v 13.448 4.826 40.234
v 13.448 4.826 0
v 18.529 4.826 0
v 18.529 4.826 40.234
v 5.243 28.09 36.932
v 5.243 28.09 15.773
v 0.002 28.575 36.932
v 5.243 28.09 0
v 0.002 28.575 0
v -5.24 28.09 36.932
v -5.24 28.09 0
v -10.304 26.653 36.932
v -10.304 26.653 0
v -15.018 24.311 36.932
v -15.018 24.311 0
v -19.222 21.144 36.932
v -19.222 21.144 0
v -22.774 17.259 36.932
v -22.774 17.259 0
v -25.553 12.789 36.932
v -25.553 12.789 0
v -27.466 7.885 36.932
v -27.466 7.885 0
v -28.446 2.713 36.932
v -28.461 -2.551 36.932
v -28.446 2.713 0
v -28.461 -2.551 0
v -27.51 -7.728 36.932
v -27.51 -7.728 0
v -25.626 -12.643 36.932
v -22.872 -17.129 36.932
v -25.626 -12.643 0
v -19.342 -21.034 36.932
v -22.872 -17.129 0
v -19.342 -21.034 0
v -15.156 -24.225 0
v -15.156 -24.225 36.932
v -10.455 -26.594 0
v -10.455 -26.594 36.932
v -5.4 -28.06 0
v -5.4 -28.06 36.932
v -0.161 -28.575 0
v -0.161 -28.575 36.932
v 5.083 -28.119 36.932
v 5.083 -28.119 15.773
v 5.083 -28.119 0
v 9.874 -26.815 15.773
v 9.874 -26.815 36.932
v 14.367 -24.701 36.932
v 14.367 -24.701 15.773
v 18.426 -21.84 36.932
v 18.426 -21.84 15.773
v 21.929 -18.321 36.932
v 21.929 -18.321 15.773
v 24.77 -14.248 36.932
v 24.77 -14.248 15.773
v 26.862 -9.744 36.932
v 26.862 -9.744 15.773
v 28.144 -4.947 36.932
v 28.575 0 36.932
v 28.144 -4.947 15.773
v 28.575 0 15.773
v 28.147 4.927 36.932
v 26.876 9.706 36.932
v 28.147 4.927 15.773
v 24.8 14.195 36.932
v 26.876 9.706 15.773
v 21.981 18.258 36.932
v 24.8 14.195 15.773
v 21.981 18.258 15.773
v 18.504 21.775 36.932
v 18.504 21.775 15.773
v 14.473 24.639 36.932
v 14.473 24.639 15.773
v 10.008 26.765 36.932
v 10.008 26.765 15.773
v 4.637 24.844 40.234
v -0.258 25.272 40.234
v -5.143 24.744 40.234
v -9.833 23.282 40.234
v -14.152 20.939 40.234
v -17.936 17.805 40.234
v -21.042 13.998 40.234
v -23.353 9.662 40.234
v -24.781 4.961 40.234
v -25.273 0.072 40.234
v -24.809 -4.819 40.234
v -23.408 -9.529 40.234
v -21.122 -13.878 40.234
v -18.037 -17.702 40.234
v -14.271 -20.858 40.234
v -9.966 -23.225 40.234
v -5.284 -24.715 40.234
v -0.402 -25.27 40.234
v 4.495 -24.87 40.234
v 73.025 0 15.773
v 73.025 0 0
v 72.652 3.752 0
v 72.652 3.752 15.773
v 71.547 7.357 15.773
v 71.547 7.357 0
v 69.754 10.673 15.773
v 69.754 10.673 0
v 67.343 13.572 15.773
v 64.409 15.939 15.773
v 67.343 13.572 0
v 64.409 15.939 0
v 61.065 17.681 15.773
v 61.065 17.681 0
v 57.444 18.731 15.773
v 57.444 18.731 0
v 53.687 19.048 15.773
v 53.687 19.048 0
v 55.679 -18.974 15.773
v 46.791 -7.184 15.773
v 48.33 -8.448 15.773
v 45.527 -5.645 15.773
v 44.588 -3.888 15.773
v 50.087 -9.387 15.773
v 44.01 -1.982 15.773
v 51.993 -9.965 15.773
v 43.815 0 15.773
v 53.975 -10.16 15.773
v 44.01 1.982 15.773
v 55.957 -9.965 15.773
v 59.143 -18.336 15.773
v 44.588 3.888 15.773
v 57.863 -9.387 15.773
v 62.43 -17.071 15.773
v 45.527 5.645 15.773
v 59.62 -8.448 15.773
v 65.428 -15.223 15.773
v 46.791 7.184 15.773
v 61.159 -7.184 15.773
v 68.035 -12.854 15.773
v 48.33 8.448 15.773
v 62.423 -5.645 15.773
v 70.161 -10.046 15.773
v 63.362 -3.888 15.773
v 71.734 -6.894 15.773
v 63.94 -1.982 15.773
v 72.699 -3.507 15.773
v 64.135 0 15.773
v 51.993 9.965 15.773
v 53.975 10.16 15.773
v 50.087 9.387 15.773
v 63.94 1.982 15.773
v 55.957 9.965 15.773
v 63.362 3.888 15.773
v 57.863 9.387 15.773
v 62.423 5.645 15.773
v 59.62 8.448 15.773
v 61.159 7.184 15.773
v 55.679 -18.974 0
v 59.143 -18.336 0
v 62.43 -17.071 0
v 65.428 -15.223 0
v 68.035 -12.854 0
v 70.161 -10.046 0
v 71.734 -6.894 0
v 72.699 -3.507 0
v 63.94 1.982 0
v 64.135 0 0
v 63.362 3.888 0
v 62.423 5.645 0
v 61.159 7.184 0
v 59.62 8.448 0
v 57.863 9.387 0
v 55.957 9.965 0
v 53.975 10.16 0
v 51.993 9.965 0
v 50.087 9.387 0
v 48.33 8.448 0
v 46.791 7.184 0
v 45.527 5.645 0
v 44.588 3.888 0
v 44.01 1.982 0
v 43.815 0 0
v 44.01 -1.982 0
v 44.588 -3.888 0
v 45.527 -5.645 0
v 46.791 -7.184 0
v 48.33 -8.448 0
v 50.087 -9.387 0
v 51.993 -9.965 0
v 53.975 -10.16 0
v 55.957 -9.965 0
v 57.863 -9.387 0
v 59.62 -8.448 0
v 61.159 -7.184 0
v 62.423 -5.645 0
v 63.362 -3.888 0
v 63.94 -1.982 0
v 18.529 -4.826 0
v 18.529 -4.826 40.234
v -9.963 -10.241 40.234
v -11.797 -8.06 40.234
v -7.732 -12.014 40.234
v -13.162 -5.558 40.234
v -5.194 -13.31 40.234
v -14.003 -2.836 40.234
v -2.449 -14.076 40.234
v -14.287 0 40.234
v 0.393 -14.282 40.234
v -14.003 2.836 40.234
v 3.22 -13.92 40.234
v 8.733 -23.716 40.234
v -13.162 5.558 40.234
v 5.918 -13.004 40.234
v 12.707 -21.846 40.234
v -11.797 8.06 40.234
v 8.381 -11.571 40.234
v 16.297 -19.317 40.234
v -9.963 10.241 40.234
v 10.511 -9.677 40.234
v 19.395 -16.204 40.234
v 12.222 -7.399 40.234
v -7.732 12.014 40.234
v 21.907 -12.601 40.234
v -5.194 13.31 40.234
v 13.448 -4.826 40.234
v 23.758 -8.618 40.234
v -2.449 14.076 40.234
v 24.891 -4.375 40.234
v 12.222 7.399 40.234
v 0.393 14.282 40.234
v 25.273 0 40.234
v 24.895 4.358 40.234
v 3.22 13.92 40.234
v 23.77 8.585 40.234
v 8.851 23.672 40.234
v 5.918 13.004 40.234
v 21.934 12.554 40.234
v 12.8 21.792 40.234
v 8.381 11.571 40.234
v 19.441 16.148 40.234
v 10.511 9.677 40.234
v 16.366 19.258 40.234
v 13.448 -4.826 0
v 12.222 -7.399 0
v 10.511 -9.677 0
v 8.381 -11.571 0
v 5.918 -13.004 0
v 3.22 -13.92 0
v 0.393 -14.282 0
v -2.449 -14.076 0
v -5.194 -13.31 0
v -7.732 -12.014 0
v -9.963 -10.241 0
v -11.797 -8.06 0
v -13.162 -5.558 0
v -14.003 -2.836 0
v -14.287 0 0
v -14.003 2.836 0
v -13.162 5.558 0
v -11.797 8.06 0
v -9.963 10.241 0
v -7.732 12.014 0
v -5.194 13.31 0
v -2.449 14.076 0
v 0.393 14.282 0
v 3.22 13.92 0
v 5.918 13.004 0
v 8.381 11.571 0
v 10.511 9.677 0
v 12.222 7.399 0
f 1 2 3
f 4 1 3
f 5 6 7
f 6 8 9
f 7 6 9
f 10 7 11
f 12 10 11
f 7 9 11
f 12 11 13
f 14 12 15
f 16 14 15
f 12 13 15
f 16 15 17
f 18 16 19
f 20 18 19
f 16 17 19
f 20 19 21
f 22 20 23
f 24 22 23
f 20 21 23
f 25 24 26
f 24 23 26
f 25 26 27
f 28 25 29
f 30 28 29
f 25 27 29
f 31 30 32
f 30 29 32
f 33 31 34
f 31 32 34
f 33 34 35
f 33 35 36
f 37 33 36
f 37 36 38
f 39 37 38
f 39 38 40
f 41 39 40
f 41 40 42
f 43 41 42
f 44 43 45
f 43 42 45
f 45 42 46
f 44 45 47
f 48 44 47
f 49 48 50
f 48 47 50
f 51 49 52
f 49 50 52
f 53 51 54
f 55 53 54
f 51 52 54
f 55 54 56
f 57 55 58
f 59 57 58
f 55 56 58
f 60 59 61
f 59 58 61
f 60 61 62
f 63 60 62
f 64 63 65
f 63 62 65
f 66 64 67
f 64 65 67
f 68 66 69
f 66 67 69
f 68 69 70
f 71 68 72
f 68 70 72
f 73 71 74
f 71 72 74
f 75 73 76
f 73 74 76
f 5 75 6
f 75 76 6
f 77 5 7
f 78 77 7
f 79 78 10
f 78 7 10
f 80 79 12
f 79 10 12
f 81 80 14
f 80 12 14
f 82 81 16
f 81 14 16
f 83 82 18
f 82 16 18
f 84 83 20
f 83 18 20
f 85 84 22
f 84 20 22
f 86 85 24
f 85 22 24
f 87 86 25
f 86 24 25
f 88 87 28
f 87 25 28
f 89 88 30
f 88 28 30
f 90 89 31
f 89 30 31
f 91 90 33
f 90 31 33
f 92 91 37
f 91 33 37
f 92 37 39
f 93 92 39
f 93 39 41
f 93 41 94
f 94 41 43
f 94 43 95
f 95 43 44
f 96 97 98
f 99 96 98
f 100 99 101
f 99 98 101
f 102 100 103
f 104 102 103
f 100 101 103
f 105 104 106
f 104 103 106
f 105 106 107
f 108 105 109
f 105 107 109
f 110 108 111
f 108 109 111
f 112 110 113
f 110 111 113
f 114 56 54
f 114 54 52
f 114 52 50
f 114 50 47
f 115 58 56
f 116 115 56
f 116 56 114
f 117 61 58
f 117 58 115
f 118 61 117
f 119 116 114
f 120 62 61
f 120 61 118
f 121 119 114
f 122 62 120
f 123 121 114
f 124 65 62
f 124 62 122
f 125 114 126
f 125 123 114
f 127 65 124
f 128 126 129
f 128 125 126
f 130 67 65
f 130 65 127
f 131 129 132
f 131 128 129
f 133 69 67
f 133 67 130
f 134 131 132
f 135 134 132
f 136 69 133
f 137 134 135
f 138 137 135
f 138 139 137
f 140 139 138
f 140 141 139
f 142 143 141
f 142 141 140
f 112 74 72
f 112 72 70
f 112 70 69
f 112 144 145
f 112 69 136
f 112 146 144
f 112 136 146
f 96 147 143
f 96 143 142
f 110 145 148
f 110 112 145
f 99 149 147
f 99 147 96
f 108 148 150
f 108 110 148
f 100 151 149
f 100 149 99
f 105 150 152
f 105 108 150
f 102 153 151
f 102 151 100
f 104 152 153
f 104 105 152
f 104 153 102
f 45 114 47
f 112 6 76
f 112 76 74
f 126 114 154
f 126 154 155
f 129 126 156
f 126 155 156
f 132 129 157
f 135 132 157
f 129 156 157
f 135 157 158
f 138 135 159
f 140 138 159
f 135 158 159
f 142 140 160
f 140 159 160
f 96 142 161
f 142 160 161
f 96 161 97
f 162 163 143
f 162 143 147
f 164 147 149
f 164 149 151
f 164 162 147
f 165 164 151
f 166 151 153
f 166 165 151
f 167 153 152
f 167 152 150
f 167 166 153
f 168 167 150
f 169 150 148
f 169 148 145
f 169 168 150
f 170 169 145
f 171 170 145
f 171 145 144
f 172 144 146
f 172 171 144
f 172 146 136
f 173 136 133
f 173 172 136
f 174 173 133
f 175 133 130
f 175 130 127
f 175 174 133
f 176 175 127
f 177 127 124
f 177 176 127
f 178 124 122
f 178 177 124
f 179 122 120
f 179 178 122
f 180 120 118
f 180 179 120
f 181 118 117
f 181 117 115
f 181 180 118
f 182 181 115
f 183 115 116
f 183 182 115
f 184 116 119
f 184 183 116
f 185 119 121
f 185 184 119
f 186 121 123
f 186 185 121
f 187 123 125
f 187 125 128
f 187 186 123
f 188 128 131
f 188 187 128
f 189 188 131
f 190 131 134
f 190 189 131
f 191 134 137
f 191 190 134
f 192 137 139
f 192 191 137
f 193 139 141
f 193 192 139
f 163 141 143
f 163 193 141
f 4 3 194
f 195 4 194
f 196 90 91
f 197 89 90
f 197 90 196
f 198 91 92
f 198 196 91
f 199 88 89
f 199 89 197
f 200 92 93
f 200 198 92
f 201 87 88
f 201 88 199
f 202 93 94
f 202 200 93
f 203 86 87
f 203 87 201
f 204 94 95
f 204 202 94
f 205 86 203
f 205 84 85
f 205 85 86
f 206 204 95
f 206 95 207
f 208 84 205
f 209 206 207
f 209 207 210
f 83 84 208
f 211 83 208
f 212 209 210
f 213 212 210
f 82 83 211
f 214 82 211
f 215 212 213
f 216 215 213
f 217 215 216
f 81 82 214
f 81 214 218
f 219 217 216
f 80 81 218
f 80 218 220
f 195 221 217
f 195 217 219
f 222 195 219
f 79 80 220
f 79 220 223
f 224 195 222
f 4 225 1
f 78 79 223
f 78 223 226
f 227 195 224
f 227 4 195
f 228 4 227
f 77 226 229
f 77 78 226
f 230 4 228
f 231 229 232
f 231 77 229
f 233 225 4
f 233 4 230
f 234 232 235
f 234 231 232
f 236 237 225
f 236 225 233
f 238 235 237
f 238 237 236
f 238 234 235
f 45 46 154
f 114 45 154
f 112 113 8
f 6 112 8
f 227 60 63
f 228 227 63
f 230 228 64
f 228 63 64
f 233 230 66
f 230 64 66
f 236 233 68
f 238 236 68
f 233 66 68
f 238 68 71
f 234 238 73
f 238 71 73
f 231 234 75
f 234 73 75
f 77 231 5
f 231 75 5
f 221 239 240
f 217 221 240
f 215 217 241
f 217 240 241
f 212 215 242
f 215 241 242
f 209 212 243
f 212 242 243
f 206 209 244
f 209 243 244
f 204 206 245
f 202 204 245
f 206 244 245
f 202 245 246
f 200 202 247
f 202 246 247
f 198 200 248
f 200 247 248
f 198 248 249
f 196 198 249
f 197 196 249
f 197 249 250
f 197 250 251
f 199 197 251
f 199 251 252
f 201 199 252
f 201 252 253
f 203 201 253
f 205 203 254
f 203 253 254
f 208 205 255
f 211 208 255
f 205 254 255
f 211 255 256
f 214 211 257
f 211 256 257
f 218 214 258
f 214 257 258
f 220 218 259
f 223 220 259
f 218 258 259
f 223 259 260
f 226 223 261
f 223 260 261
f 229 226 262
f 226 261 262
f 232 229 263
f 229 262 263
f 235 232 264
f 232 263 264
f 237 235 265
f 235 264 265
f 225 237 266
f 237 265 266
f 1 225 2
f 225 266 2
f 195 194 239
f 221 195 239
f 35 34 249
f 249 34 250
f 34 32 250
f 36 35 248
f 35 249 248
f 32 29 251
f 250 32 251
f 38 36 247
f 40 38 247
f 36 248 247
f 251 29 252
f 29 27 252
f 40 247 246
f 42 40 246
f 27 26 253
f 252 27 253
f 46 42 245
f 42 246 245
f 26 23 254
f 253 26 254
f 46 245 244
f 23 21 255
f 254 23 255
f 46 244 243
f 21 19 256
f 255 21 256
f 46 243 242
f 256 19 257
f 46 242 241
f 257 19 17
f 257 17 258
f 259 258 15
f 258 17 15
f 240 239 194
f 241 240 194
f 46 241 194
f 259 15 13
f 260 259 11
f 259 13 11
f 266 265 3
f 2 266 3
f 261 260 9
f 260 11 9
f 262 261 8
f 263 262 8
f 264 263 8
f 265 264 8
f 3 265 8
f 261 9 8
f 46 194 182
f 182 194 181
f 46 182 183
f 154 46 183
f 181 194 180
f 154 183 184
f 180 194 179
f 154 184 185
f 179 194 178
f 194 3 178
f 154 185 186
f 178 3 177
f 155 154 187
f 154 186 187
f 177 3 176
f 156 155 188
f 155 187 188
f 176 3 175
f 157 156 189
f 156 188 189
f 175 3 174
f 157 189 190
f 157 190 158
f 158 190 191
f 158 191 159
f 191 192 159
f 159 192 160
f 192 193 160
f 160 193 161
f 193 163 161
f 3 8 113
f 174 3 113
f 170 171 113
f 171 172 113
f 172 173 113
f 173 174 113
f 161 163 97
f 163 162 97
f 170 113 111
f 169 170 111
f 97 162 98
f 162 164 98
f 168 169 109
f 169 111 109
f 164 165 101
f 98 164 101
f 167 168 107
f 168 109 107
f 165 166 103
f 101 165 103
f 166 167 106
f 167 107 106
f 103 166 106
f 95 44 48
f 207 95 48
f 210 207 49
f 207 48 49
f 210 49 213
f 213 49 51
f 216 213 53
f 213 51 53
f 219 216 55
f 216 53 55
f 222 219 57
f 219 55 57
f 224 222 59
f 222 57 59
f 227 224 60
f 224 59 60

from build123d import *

# Parameters (mm, degrees)
F0_R     = 10.16
F1_DEPTH = 15.7734
F2_DEPTH = 40.2336
F3_SIZE  = 3.302


# Not quite as in the source:
# - a feature names something its author has since deleted; it is built from what else it names


with BuildPart() as f1:
    # F0 (on Top) → F1 (new body)
    with BuildSketch(Plane.XY):
        with BuildLine():
            ThreePointArc((5.2429423077, 28.0898946413), (21.9812158608, 18.258060529), (28.575, 0))
            ThreePointArc((28.575, 0), (21.9291125509, -18.3206071879), (5.0828111824, -28.1193110777))
            Line((5.0828111824, -28.1193110777), (55.6786843639, -18.9736648961))
            ThreePointArc((55.6786843639, -18.9736648961), (34.9510761924, -0.9964050199), (53.687254757, 19.0478267179))
            Line((53.687254757, 19.0478267179), (5.2429423077, 28.0898946413))
        make_face()
        with BuildLine():
            ThreePointArc((73.025, 0), (67.3432637826, 13.5717361984), (53.687254757, 19.0478267179))
            ThreePointArc((53.687254757, 19.0478267179), (34.9510761924, -0.9964050199), (55.6786843639, -18.9736648961))
            ThreePointArc((55.6786843639, -18.9736648961), (68.0348308513, -12.8539354454), (73.025, 0))
        make_face()
        with Locations((53.975, 0)):
            Circle(F0_R, mode=Mode.SUBTRACT)
    extrude(amount=F1_DEPTH)

    # F0 (on Top) → F2 (join)
    with BuildSketch(Plane.XY):
        with BuildLine():
            ThreePointArc((5.0828111824, -28.1193110777), (21.9291125509, -18.3206071879), (28.575, 0))
            ThreePointArc((28.575, 0), (21.9812158608, 18.258060529), (5.2429423077, 28.0898946413))
            ThreePointArc((5.2429423077, 28.0898946413), (-28.5748840448, 0.0814053193), (5.0828111824, -28.1193110777))
        make_face()
        with BuildLine():
            ThreePointArc((13.4477648793, -4.826), (-14.2875, 0), (13.4477648793, 4.826))
            Line((13.4477648793, 4.826), (18.5293, 4.826))
            Line((18.5293, 4.826), (18.5293, 0))
            Line((18.5293, 0), (18.5293, -4.826))
            Line((18.5293, -4.826), (13.4477648793, -4.826))
        make_face(mode=Mode.SUBTRACT)
    extrude(amount=F2_DEPTH)

    # F3
    f3_edges = [f1.edges().sort_by_distance(p)[0] for p in [
        (-5.082811, 28.119311, 40.2336),
    ]]
    chamfer(f3_edges, length=F3_SIZE)


solid = f1.part
